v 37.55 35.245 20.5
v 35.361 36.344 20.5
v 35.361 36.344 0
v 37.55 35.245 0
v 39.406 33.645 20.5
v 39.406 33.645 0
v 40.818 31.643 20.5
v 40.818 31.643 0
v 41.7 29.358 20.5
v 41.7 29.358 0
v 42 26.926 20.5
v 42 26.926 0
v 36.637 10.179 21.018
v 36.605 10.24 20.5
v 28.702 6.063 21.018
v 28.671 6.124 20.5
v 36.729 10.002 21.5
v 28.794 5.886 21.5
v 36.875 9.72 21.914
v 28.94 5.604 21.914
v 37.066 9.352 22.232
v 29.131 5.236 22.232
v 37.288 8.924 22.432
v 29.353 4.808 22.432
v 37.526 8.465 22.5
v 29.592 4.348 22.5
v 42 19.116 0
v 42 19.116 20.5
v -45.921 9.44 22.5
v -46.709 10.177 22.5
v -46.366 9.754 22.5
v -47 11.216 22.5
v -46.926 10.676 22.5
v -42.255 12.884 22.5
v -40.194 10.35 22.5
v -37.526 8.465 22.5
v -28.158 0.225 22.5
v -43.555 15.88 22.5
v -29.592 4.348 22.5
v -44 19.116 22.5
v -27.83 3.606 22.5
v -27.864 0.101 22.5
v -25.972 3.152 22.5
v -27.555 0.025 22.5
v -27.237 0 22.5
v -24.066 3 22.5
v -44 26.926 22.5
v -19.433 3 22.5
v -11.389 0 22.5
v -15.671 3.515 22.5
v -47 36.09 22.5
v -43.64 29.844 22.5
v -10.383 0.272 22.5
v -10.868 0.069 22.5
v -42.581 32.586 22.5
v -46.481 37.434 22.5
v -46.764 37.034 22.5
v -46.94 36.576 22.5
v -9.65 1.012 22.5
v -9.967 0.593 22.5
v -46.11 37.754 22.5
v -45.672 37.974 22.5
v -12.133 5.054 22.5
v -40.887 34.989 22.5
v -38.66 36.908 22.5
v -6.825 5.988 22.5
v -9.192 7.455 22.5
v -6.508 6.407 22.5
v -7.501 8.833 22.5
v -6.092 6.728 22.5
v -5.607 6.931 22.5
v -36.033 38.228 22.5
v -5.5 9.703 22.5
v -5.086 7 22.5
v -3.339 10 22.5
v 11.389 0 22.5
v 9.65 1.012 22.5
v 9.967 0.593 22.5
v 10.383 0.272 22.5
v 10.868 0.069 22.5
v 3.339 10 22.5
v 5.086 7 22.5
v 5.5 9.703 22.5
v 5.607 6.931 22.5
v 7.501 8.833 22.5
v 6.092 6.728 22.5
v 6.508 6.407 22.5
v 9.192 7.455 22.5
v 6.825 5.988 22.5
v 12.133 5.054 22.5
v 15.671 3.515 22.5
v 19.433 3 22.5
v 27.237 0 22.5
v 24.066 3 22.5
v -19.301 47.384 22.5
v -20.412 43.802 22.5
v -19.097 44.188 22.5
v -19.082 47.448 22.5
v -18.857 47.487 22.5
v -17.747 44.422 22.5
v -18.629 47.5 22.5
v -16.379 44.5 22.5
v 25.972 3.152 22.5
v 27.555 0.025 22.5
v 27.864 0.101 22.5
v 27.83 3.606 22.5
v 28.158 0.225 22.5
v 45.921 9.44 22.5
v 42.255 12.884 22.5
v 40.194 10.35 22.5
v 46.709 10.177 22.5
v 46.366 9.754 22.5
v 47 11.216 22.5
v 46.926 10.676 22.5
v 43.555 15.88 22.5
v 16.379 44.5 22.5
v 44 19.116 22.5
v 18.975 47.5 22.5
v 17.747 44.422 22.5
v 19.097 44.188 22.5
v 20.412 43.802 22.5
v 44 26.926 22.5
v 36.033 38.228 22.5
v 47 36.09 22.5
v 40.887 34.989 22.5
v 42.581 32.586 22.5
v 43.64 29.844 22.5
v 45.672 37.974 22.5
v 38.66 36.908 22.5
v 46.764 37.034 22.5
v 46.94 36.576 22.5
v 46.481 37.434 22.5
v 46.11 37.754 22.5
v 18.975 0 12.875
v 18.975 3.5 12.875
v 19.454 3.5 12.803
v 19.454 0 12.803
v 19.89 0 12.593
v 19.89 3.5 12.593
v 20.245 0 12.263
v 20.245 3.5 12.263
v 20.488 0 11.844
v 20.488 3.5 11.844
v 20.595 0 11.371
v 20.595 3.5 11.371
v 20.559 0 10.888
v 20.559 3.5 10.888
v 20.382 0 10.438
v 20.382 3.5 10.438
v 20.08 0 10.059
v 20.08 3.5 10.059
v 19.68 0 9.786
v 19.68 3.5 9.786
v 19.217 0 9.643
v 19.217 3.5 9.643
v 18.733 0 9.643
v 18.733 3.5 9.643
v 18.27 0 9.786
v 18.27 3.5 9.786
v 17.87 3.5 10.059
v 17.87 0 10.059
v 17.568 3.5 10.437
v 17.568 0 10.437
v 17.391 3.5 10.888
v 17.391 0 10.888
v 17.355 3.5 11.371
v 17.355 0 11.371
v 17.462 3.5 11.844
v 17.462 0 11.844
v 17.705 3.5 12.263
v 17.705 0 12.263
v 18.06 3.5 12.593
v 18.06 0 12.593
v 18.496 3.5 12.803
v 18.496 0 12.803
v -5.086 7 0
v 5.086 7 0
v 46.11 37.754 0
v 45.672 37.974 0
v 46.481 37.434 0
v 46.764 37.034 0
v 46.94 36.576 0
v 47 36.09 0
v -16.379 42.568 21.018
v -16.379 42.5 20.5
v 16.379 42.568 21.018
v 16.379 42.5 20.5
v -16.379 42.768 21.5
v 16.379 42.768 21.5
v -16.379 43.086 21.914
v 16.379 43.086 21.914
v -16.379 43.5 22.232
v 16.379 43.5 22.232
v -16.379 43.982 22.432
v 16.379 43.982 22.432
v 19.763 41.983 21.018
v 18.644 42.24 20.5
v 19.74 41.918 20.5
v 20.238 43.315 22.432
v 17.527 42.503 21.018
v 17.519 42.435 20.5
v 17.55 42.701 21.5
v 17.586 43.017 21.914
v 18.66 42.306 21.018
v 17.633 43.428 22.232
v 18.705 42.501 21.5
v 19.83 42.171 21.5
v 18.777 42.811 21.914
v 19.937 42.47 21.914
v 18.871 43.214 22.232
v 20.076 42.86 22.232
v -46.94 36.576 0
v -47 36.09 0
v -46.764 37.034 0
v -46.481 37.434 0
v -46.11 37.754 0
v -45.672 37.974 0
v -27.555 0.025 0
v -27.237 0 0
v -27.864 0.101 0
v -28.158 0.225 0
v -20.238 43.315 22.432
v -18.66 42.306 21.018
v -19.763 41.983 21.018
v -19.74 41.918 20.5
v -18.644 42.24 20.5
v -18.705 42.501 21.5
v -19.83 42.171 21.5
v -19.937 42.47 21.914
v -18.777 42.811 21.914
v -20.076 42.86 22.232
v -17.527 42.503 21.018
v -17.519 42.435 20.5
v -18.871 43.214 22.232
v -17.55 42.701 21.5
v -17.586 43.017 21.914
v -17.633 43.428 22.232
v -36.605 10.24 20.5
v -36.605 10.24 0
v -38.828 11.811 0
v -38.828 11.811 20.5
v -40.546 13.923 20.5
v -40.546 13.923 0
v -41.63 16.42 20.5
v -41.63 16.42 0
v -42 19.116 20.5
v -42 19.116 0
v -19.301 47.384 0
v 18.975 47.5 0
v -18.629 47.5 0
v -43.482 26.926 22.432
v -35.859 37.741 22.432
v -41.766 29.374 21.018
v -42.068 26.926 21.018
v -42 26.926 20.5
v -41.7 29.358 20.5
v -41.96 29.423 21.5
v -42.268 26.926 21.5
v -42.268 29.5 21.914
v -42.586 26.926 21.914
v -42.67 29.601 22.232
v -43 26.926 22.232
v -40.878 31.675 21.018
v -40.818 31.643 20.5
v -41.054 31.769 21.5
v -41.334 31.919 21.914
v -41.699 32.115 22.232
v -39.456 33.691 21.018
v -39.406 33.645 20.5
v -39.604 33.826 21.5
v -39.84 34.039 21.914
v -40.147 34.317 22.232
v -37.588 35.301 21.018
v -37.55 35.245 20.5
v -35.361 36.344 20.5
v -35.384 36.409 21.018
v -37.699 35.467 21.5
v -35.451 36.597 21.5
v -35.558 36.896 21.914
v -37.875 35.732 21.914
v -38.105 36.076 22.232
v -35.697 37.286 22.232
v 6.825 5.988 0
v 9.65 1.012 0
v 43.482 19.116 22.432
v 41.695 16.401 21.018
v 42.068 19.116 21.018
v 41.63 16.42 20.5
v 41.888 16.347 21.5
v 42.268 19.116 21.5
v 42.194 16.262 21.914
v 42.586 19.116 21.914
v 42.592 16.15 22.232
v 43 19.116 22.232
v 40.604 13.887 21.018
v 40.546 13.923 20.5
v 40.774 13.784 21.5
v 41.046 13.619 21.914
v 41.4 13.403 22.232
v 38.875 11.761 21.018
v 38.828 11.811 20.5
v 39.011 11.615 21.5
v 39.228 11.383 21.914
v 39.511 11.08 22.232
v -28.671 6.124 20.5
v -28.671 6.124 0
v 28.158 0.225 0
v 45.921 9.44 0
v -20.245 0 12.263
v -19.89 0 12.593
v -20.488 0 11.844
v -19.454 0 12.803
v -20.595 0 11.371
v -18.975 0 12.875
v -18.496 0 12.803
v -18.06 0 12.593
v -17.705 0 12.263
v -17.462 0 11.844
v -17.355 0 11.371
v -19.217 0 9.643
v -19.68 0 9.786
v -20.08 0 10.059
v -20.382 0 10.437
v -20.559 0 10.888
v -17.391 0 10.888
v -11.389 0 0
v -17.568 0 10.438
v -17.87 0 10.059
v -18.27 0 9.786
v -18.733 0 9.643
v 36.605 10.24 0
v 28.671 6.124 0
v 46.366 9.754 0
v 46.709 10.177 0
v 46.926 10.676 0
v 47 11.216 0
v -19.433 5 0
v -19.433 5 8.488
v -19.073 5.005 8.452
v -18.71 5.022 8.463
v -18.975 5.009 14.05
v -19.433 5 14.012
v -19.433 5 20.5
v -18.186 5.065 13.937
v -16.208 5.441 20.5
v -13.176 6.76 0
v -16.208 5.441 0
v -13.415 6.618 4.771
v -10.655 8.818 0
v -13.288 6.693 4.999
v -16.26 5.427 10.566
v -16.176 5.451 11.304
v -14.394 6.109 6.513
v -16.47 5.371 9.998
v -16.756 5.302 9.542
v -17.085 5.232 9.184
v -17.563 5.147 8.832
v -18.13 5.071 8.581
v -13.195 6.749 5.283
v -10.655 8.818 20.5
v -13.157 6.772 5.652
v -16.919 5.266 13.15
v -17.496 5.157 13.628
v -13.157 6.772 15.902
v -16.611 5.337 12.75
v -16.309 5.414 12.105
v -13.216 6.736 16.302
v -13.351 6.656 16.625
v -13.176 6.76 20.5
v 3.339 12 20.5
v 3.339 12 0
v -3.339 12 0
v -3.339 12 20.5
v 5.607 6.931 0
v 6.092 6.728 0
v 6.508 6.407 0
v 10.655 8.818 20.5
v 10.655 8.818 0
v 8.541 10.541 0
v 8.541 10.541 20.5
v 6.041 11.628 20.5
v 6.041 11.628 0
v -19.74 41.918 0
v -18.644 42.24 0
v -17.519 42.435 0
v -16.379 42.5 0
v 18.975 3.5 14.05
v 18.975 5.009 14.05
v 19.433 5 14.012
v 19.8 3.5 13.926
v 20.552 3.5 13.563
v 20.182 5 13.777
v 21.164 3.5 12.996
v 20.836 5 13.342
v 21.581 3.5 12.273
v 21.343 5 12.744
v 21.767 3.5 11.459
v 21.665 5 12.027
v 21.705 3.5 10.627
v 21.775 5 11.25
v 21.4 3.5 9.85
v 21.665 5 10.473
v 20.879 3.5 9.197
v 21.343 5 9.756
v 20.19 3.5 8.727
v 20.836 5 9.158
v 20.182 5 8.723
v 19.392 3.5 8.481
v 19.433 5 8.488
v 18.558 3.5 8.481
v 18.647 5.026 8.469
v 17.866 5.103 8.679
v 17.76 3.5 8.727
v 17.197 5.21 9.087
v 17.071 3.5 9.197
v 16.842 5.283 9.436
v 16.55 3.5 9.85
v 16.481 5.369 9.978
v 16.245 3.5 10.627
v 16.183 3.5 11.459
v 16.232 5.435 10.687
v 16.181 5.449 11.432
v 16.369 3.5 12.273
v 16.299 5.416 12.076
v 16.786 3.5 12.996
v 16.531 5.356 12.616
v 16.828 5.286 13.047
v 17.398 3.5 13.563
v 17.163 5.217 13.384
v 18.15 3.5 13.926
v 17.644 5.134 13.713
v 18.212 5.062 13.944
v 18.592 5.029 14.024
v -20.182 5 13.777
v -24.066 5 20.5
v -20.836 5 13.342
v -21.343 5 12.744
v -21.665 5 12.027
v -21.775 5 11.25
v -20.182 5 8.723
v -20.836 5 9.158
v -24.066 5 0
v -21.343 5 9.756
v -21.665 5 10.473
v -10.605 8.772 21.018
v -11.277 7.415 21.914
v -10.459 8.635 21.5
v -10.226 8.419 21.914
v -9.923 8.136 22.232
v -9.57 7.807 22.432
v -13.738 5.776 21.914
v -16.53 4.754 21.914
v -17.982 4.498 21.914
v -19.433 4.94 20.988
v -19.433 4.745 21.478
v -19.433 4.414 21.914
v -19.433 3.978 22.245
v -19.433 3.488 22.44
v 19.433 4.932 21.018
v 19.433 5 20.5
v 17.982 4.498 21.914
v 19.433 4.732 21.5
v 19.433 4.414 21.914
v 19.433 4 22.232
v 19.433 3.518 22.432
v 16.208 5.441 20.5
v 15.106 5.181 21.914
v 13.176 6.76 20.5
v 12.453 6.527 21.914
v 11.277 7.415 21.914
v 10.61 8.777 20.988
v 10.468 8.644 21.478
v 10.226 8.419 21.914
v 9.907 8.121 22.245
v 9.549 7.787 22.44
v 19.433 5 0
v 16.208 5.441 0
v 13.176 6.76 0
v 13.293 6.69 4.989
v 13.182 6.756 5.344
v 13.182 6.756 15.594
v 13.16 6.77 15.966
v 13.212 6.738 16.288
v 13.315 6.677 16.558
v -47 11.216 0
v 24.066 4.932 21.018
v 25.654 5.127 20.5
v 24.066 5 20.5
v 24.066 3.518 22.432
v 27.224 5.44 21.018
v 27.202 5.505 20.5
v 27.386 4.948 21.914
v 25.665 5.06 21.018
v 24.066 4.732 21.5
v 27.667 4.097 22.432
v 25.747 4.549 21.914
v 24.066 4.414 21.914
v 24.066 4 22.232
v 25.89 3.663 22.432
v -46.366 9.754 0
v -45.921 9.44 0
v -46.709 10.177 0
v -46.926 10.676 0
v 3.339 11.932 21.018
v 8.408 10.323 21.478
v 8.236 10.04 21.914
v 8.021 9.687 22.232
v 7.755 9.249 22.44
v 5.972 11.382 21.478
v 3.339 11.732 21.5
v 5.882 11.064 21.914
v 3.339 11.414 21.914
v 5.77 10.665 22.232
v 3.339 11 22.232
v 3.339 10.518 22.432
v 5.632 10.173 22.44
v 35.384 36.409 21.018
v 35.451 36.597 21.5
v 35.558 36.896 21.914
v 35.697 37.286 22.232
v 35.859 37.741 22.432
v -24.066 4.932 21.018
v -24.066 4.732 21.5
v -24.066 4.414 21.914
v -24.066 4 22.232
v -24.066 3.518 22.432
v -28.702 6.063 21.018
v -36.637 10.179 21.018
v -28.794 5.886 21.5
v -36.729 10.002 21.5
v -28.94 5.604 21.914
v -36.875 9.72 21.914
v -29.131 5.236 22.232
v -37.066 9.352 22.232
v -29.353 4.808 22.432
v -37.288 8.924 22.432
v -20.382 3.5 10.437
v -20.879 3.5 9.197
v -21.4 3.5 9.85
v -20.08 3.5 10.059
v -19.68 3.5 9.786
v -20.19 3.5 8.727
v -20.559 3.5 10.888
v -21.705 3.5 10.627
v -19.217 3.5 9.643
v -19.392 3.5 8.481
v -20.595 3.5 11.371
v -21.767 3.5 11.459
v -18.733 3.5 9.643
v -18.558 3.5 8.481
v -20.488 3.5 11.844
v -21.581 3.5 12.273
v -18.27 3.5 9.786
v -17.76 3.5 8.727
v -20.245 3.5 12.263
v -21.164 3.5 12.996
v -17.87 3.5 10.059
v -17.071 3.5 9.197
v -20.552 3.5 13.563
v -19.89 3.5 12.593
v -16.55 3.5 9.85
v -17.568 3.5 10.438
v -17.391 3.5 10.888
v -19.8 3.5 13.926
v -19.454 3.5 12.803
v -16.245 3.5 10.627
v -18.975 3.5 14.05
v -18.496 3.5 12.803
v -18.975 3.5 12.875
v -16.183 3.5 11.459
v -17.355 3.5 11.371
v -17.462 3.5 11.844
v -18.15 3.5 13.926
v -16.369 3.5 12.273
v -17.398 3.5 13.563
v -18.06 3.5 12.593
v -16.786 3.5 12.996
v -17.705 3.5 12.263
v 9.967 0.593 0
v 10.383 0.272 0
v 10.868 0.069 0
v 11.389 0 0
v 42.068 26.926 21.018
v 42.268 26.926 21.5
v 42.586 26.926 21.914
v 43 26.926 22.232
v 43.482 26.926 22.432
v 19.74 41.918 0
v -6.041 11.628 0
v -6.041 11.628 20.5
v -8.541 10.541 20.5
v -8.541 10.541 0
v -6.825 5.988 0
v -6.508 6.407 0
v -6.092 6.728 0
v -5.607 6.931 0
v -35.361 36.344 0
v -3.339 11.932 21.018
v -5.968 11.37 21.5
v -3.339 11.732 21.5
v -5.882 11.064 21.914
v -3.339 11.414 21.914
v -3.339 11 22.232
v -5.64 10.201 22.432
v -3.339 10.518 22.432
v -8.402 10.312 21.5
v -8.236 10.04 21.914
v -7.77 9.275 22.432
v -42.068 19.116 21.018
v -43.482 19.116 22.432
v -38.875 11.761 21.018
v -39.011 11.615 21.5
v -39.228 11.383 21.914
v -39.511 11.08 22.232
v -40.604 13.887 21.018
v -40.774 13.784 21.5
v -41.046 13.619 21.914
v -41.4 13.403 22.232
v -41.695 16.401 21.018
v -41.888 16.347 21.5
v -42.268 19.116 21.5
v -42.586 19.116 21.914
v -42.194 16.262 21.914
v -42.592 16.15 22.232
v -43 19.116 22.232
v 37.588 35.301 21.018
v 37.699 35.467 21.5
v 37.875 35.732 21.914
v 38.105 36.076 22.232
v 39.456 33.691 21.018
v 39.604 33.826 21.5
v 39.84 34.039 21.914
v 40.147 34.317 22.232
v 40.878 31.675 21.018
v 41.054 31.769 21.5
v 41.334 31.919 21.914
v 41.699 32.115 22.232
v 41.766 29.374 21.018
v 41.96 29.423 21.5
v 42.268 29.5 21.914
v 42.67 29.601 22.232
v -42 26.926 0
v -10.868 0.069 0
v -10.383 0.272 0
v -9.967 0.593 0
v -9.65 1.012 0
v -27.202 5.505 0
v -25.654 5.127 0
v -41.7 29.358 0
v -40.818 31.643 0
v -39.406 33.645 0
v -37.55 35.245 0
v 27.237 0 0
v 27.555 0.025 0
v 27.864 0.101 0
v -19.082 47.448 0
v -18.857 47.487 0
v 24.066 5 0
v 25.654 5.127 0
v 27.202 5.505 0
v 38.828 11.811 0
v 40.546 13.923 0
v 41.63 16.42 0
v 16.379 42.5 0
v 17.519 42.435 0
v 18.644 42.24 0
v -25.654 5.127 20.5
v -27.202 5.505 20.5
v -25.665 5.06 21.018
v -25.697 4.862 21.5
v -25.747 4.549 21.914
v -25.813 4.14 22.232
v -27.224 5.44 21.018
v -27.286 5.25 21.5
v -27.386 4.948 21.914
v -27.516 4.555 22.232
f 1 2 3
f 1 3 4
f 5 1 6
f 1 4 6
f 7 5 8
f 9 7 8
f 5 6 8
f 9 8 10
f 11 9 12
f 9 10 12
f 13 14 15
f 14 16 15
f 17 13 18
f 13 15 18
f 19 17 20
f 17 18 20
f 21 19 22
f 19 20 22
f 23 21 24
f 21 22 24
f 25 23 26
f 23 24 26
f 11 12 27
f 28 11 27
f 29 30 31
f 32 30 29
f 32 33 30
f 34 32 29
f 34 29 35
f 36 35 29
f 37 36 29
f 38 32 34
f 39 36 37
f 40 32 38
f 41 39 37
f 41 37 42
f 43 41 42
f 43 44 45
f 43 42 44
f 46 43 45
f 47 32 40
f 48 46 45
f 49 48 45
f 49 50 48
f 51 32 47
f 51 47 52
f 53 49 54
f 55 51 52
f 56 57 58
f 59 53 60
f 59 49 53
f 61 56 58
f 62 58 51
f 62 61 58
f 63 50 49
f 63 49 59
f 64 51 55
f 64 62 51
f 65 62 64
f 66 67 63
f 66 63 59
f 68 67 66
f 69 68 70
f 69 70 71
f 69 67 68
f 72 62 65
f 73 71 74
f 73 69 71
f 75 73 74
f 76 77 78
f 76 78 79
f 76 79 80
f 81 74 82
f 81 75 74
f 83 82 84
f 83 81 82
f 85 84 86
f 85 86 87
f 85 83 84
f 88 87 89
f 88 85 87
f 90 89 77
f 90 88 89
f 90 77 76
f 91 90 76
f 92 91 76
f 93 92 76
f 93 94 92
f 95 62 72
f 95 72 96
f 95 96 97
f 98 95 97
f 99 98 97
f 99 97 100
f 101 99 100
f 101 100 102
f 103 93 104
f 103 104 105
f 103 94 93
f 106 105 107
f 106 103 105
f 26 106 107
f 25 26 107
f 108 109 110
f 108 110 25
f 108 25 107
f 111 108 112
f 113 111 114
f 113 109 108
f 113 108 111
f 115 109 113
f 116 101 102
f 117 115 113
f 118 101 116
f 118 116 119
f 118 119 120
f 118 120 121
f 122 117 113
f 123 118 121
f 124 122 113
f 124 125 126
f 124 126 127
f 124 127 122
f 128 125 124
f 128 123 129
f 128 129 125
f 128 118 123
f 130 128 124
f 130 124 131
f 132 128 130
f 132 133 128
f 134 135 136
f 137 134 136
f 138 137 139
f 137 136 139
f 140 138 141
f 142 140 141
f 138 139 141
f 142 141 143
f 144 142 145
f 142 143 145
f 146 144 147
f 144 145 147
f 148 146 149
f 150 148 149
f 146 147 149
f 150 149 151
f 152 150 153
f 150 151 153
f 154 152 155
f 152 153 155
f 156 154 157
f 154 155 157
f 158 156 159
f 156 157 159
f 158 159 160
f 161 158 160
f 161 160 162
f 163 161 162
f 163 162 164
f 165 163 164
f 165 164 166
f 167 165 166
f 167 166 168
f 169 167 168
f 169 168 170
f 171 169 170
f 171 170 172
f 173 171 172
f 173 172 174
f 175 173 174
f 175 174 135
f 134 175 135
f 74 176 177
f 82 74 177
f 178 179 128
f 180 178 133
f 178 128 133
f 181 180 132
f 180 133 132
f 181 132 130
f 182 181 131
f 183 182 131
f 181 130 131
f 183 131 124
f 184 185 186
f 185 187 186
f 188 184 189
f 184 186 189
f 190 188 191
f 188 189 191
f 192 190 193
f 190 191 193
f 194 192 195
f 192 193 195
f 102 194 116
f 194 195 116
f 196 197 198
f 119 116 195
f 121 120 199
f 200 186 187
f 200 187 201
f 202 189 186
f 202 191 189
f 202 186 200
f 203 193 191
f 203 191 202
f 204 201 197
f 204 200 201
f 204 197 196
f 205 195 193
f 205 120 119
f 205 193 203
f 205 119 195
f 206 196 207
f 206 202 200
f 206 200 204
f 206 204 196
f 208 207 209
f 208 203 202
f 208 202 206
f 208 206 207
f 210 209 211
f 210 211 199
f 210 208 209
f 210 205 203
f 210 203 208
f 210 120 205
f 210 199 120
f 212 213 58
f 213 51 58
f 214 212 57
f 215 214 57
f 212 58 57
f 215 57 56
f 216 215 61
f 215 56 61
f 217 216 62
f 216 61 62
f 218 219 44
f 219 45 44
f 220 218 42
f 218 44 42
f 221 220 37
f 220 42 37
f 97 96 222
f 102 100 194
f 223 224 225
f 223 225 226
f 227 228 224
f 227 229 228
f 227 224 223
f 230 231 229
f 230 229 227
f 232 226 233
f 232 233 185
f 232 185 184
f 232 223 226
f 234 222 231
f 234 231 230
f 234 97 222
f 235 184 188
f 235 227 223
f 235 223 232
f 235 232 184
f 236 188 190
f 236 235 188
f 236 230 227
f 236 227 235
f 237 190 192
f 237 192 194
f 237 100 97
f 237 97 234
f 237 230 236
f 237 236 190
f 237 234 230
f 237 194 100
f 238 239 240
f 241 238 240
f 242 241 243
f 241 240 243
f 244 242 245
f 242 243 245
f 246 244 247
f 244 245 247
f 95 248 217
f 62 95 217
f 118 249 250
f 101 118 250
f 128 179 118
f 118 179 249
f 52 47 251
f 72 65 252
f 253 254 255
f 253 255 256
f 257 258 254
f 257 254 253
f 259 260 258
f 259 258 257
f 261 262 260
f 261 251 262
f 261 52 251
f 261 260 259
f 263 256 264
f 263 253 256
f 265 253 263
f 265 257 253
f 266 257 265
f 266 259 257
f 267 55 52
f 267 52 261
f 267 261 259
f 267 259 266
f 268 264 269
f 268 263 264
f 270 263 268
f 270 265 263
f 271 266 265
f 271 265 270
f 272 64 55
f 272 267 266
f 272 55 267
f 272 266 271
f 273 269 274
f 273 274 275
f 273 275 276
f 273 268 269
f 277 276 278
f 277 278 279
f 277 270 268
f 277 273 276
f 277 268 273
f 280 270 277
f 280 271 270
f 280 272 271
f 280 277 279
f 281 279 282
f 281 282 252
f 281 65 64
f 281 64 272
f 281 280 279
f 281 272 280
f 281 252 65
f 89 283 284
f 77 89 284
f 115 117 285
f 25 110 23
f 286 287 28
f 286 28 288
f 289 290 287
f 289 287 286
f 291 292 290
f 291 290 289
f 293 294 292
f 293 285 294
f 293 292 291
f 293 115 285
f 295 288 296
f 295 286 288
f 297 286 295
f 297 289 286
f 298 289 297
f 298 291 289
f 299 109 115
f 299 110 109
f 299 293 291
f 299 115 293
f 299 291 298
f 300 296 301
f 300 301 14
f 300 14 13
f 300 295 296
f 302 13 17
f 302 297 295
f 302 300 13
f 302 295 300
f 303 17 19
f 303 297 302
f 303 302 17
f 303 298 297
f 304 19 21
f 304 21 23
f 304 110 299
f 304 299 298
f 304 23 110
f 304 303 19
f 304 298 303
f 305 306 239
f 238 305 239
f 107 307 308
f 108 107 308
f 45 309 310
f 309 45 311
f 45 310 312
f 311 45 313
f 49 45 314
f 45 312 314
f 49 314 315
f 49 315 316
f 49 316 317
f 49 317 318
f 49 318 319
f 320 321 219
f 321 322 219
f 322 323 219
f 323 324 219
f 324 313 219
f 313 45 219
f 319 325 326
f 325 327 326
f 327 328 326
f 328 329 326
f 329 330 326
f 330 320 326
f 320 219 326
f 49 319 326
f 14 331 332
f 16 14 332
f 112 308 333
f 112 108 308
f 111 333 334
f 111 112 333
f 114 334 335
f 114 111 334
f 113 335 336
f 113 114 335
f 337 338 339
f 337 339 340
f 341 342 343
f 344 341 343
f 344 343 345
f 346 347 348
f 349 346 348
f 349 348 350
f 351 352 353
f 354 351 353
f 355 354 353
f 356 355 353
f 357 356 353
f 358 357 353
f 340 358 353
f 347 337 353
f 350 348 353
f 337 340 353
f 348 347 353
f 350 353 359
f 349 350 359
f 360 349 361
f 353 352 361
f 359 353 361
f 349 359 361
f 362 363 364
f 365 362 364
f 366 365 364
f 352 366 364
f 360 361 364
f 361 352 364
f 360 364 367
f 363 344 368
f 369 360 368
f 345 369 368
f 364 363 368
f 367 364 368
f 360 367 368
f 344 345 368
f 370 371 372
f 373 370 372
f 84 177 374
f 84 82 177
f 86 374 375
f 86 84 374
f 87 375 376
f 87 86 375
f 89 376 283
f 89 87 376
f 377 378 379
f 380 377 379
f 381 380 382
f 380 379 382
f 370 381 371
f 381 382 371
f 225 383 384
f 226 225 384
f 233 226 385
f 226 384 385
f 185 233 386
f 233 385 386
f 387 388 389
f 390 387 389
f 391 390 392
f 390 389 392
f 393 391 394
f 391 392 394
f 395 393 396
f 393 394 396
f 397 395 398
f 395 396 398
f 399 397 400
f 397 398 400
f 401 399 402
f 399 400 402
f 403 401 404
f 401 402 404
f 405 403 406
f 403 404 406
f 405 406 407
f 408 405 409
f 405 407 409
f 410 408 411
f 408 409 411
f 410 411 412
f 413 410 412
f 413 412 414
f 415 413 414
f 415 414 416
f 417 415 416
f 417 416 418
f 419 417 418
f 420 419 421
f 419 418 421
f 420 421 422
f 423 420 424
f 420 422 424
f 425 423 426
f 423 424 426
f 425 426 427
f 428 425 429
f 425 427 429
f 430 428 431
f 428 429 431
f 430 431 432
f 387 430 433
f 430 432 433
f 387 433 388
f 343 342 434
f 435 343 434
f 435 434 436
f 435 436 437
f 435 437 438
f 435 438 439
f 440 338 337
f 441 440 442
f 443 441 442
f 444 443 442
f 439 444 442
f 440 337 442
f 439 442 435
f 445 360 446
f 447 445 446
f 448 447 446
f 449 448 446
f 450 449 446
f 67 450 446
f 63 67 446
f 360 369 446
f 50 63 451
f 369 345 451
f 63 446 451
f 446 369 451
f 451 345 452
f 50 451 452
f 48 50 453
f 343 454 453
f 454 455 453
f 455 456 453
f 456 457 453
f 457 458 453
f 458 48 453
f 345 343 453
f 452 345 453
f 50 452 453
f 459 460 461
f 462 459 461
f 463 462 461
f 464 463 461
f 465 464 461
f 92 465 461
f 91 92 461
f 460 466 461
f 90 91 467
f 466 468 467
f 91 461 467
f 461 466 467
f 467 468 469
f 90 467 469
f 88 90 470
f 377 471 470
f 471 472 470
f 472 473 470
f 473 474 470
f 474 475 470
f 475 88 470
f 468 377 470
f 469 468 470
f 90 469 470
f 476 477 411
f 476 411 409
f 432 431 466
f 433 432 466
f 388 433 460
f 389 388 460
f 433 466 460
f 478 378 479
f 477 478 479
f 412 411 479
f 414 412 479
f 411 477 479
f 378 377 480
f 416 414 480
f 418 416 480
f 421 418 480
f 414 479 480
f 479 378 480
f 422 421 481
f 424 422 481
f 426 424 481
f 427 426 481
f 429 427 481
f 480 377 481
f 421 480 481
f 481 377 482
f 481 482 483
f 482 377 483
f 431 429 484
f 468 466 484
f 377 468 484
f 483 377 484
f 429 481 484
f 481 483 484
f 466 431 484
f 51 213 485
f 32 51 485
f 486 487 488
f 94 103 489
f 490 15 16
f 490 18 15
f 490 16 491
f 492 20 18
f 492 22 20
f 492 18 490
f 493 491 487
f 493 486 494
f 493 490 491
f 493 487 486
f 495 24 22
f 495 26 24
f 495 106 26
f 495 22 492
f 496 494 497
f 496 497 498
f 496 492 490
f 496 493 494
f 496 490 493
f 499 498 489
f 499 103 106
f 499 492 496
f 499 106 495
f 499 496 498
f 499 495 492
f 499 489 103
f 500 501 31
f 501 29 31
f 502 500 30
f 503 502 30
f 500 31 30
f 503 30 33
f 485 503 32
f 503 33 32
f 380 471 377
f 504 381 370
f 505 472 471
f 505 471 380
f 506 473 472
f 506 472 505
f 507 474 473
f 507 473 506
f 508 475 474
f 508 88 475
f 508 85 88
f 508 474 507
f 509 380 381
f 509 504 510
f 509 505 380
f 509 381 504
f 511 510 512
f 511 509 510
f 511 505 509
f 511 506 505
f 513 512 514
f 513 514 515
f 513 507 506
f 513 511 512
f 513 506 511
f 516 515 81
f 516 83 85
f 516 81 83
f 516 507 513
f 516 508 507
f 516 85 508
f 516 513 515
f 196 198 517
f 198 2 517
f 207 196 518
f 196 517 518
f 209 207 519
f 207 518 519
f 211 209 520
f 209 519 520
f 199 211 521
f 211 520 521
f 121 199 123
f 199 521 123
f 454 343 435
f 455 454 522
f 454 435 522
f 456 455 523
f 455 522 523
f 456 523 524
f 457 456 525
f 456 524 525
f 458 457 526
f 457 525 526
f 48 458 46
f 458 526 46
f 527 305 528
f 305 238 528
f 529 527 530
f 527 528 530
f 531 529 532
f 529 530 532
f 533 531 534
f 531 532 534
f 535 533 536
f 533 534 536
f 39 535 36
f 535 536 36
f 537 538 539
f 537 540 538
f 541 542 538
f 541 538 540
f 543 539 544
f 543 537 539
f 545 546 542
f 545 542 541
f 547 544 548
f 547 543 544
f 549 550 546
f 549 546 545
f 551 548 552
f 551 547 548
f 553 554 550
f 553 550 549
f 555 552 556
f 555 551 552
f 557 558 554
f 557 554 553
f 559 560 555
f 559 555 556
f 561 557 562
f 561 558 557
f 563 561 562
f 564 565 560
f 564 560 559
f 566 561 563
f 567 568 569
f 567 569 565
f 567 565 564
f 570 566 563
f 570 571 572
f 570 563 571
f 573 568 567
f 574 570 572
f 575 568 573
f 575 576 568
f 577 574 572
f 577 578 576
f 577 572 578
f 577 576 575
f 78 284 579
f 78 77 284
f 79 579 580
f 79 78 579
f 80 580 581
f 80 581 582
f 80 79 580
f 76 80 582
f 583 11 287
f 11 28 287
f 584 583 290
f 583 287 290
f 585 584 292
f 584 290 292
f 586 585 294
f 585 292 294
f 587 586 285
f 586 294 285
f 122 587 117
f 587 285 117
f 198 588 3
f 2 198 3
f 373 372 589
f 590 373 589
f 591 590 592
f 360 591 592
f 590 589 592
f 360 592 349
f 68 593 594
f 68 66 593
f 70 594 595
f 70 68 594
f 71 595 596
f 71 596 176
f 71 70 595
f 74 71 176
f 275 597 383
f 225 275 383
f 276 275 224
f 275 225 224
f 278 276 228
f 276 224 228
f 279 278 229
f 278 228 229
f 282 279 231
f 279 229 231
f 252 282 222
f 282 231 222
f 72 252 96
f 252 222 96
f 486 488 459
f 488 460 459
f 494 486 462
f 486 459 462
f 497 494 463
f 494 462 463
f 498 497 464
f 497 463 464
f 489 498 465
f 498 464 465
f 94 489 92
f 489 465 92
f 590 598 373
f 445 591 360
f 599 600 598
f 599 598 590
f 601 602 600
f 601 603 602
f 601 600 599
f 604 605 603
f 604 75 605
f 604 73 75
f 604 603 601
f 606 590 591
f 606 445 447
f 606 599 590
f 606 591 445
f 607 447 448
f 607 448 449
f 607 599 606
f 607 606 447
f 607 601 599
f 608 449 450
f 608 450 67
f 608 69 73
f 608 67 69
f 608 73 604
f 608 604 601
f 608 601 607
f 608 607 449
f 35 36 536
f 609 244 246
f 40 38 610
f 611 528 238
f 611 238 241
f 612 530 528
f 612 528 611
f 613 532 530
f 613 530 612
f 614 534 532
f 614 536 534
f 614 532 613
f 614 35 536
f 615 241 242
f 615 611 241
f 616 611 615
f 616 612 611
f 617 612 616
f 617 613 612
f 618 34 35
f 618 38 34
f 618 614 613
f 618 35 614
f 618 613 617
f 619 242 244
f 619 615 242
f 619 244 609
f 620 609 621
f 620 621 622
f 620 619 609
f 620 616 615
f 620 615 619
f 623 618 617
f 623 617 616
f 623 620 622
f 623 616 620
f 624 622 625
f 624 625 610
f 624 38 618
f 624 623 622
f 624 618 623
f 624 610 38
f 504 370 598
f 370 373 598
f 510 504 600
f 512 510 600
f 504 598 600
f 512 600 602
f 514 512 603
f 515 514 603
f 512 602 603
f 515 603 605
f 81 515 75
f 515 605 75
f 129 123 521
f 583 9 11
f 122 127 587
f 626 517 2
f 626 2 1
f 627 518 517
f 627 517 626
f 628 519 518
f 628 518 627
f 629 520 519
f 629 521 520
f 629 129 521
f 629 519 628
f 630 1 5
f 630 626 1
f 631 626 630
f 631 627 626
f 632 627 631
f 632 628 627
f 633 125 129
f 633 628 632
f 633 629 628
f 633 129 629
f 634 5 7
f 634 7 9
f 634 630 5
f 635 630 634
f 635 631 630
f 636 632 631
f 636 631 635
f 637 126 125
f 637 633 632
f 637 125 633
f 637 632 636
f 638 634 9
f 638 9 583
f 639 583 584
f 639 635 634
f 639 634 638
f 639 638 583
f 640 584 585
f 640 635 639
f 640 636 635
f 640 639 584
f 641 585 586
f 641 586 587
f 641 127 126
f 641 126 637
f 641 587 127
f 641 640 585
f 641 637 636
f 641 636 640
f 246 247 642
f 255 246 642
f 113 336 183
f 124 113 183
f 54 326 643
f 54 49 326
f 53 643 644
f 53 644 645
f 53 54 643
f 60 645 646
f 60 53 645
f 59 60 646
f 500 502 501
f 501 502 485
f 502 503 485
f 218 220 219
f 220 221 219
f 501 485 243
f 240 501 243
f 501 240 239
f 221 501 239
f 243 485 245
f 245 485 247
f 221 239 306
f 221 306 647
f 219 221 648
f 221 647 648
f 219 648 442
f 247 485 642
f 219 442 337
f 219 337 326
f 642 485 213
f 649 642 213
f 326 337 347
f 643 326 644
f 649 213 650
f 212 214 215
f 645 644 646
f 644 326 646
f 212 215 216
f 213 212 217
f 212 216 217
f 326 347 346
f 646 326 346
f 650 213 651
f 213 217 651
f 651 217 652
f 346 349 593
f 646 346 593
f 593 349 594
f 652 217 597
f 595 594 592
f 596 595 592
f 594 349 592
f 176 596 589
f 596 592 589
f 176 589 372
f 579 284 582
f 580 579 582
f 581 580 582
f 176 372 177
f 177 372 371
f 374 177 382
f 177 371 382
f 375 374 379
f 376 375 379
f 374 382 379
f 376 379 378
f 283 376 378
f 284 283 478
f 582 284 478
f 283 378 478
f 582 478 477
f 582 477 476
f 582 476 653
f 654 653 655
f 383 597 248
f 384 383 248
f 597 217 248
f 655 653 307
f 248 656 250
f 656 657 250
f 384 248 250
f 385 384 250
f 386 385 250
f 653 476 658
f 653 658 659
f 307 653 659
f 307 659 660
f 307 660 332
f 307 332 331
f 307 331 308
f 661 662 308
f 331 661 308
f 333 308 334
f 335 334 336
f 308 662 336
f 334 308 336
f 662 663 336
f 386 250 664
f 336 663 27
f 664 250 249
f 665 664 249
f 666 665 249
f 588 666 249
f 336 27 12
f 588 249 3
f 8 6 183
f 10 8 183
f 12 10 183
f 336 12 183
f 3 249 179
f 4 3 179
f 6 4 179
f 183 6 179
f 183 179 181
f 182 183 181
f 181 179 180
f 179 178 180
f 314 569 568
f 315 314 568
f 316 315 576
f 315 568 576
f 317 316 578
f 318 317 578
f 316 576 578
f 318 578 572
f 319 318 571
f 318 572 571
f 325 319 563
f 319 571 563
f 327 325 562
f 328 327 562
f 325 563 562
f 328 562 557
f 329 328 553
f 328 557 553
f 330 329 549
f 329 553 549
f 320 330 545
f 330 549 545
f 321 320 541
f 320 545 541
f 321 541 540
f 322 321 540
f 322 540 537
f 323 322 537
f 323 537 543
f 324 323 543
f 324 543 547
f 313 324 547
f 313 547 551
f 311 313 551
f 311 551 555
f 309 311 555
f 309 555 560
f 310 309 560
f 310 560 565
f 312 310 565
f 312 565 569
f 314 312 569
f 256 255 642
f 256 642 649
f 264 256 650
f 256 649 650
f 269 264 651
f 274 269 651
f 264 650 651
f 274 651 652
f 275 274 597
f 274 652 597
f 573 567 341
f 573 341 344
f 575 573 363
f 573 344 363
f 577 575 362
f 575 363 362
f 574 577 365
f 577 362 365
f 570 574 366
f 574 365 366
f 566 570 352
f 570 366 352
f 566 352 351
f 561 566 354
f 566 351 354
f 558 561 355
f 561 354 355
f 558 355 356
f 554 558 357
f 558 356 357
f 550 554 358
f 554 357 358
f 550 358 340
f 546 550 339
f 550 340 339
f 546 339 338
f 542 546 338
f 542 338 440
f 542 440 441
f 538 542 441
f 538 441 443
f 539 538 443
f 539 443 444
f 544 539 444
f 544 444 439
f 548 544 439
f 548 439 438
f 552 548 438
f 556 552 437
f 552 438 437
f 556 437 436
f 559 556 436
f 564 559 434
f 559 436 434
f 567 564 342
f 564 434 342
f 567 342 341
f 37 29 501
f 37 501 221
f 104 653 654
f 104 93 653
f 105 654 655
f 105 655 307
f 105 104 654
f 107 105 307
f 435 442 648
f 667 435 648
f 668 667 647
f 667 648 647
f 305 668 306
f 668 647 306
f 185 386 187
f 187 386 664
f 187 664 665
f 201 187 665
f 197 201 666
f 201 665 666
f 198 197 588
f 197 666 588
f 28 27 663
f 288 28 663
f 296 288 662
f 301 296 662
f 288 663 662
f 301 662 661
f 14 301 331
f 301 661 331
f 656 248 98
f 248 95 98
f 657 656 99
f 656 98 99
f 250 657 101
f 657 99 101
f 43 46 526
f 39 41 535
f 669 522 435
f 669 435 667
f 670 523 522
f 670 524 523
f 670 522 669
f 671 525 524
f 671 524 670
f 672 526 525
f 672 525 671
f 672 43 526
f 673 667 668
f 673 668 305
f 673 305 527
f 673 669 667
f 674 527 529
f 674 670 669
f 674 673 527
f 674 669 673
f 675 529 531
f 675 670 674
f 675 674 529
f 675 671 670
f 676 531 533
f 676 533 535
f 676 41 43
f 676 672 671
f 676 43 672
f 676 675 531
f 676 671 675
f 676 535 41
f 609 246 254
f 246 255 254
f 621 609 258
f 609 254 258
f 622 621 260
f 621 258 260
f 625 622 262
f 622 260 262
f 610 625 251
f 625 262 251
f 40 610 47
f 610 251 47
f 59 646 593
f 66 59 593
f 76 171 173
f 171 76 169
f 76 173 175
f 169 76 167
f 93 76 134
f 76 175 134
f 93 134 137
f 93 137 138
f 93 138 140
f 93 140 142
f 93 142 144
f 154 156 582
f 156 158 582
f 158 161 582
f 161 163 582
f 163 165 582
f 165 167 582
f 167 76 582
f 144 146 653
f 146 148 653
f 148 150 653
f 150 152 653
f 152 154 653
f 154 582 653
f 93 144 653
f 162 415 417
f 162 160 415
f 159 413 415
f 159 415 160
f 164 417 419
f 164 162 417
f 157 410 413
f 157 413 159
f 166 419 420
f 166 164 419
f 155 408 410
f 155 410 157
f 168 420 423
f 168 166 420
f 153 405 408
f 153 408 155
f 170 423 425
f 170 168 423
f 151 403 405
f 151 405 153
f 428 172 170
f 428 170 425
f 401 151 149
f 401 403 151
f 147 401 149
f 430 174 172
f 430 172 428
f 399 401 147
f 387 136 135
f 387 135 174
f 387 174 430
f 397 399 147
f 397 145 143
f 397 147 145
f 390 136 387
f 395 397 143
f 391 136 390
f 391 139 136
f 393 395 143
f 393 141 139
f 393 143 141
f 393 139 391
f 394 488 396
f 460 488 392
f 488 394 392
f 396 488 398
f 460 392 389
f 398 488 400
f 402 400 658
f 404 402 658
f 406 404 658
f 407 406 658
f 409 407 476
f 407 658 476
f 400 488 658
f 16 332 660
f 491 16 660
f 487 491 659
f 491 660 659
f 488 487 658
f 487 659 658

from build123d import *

# Parameters (mm, degrees)
BOSS_EXTRUDE1_DEPTH = 22.5
FILLET1_R           = 12
CUT_EXTRUDE1_START  = 5.5
SCREW_MOUNT_R       = 2.8
SCREW_MOUNT_R_2     = 1.625
CUT_EXTRUDE1_DEPTH  = 2
CUT_EXTRUDE2_START  = 5
SCREW_MOUNT_3_R     = 1.625
CUT_EXTRUDE2_DEPTH  = 76.508864857
FILLET3_R           = 2
FILLET4_R           = 2


with BuildPart() as part:
    # Base → Boss-Extrude1 (new body)
    with BuildSketch(Plane.XY):
        Polygon((-27.725, 0), (-10.225, 0), (-6.25, 7), (6.25, 7), (10.225, 0), (27.725, 0), (47, 10), (47, 37.5), (18.975, 47.5), (-18.975, 47.5), (-47, 37.5), (-47, 10), align=None)
        with BuildLine():
            Line((-28.670726654, 6.123500417), (-36.605187851, 10.2399524))
            ThreePointArc((-36.605187851, 10.2399524), (-40.545521591, 13.922796166), (-42, 19.116451983))
            Line((-42, 19.116451983), (-42, 26.926039841))
            ThreePointArc((-42, 26.926039841), (-40.17334162, 32.687679084), (-35.360702646, 36.344409006))
            Line((-35.360702646, 36.344409006), (-19.7396793, 41.918369165))
            ThreePointArc((-19.7396793, 41.918369165), (-18.084307759, 42.353519464), (-16.378976654, 42.5))
            Line((-16.378976654, 42.5), (16.378976654, 42.5))
            ThreePointArc((16.378976654, 42.5), (18.084307759, 42.353519464), (19.7396793, 41.918369165))
            Line((19.7396793, 41.918369165), (35.360702646, 36.344409006))
            ThreePointArc((35.360702646, 36.344409006), (40.17334162, 32.687679084), (42, 26.926039841))
            Line((42, 26.926039841), (42, 19.116451983))
            ThreePointArc((42, 19.116451983), (40.545521591, 13.922796166), (36.605187851, 10.2399524))
            Line((36.605187851, 10.2399524), (28.670726654, 6.123500417))
            ThreePointArc((28.670726654, 6.123500417), (26.435665821, 5.284934487), (24.065538803, 5))
            Line((24.065538803, 5), (13.1356311, 5))
            Line((13.1356311, 5), (12.035146877, 6.937959637))
            ThreePointArc((12.035146877, 6.937959637), (8.370293449, 10.642325971), (3.3393689, 12))
            Line((3.3393689, 12), (-3.3393689, 12))
            ThreePointArc((-3.3393689, 12), (-8.370293449, 10.642325971), (-12.035146877, 6.937959637))
            Line((-12.035146877, 6.937959637), (-13.1356311, 5))
            Line((-13.1356311, 5), (-24.065538803, 5))
            ThreePointArc((-24.065538803, 5), (-26.435665821, 5.284934487), (-28.670726654, 6.123500417))
        make_face(mode=Mode.SUBTRACT)
    extrude(amount=BOSS_EXTRUDE1_DEPTH)

    # Fillet1
    fillet1_edges = [part.edges().sort_by_distance(p)[0] for p in [
        (13.1356311, 5, 11.25),
        (-13.1356311, 5, 11.25),
    ]]
    fillet(fillet1_edges, radius=FILLET1_R)

    # Screw_Mount → Cut-Extrude1 (cut)
    with BuildSketch(Plane(origin=(0, 0, 0), x_dir=(1, 0, 0), z_dir=(0, 1, 0)).offset(CUT_EXTRUDE1_START)):
        with Locations(Location((-18.975, -11.25, 0), (0, 0, 270))):
            Circle(SCREW_MOUNT_R)
        with Locations((-18.975, -11.25)):
            Circle(SCREW_MOUNT_R_2, mode=Mode.SUBTRACT)
        with Locations((-18.975, -11.25)):
            Circle(SCREW_MOUNT_R_2)
        with Locations(Location((18.975, -11.25, 0), (0, 0, 270))):
            Circle(SCREW_MOUNT_R)
        with Locations((18.975, -11.25)):
            Circle(SCREW_MOUNT_R_2, mode=Mode.SUBTRACT)
        with Locations((18.975, -11.25)):
            Circle(SCREW_MOUNT_R_2)
    extrude(amount=-CUT_EXTRUDE1_DEPTH, mode=Mode.SUBTRACT)

    # Screw_Mount<3> → Cut-Extrude2 (cut, through all)
    with BuildSketch(Plane(origin=(0, 0, 0), x_dir=(1, 0, 0), z_dir=(0, 1, 0)).offset(CUT_EXTRUDE2_START)):
        with Locations(Location((-18.975, -11.25, 0), (0, 0, 270))):
            Circle(SCREW_MOUNT_3_R)
        with Locations(Location((18.975, -11.25, 0), (0, 0, 270))):
            Circle(SCREW_MOUNT_3_R)
    extrude(amount=-CUT_EXTRUDE2_DEPTH, mode=Mode.SUBTRACT)

    # Fillet3
    fillet3_edges = [part.edges().sort_by_distance(p)[0] for p in [
        (-47, 10, 11.25),
        (-47, 37.5, 11.25),
        (-18.975, 47.5, 11.25),
        (47, 37.5, 11.25),
        (47, 10, 11.25),
        (27.725, 0, 11.25),
        (10.225, 0, 11.25),
        (6.25, 7, 11.25),
        (-6.25, 7, 11.25),
        (-10.225, 0, 11.25),
        (-27.725, 0, 11.25),
    ]]
    fillet(fillet3_edges, radius=FILLET3_R)

    # Fillet4
    fillet4_edges = [part.edges().sort_by_distance(p)[0] for p in [
        (21.749192321, 5, 22.5),
        (-7.327989076, 11.170109546, 22.5),
        (14.646501628, 5.995868544, 22.5),
        (-14.646501628, 5.995868544, 22.5),
        (26.435665821, 5.284934487, 22.5),
        (32.637957253, 8.181726408, 22.5),
        (40.545521591, 13.922796166, 22.5),
        (42, 23.021245912, 22.5),
        (40.17334162, 32.687679084, 22.5),
        (27.550190973, 39.131389085, 22.5),
        (18.084307759, 42.353519464, 22.5),
        (0, 42.5, 22.5),
        (-18.084307759, 42.353519464, 22.5),
        (-27.550190973, 39.131389085, 22.5),
        (-40.17334162, 32.687679084, 22.5),
        (-42, 23.021245912, 22.5),
        (-40.545521591, 13.922796166, 22.5),
        (-32.637957253, 8.181726408, 22.5),
        (-26.435665821, 5.284934487, 22.5),
        (-21.749192321, 5, 22.5),
        (0, 12, 22.5),
        (7.327989076, 11.170109546, 22.5),
    ]]
    fillet(fillet4_edges, radius=FILLET4_R)


solid = part.part
